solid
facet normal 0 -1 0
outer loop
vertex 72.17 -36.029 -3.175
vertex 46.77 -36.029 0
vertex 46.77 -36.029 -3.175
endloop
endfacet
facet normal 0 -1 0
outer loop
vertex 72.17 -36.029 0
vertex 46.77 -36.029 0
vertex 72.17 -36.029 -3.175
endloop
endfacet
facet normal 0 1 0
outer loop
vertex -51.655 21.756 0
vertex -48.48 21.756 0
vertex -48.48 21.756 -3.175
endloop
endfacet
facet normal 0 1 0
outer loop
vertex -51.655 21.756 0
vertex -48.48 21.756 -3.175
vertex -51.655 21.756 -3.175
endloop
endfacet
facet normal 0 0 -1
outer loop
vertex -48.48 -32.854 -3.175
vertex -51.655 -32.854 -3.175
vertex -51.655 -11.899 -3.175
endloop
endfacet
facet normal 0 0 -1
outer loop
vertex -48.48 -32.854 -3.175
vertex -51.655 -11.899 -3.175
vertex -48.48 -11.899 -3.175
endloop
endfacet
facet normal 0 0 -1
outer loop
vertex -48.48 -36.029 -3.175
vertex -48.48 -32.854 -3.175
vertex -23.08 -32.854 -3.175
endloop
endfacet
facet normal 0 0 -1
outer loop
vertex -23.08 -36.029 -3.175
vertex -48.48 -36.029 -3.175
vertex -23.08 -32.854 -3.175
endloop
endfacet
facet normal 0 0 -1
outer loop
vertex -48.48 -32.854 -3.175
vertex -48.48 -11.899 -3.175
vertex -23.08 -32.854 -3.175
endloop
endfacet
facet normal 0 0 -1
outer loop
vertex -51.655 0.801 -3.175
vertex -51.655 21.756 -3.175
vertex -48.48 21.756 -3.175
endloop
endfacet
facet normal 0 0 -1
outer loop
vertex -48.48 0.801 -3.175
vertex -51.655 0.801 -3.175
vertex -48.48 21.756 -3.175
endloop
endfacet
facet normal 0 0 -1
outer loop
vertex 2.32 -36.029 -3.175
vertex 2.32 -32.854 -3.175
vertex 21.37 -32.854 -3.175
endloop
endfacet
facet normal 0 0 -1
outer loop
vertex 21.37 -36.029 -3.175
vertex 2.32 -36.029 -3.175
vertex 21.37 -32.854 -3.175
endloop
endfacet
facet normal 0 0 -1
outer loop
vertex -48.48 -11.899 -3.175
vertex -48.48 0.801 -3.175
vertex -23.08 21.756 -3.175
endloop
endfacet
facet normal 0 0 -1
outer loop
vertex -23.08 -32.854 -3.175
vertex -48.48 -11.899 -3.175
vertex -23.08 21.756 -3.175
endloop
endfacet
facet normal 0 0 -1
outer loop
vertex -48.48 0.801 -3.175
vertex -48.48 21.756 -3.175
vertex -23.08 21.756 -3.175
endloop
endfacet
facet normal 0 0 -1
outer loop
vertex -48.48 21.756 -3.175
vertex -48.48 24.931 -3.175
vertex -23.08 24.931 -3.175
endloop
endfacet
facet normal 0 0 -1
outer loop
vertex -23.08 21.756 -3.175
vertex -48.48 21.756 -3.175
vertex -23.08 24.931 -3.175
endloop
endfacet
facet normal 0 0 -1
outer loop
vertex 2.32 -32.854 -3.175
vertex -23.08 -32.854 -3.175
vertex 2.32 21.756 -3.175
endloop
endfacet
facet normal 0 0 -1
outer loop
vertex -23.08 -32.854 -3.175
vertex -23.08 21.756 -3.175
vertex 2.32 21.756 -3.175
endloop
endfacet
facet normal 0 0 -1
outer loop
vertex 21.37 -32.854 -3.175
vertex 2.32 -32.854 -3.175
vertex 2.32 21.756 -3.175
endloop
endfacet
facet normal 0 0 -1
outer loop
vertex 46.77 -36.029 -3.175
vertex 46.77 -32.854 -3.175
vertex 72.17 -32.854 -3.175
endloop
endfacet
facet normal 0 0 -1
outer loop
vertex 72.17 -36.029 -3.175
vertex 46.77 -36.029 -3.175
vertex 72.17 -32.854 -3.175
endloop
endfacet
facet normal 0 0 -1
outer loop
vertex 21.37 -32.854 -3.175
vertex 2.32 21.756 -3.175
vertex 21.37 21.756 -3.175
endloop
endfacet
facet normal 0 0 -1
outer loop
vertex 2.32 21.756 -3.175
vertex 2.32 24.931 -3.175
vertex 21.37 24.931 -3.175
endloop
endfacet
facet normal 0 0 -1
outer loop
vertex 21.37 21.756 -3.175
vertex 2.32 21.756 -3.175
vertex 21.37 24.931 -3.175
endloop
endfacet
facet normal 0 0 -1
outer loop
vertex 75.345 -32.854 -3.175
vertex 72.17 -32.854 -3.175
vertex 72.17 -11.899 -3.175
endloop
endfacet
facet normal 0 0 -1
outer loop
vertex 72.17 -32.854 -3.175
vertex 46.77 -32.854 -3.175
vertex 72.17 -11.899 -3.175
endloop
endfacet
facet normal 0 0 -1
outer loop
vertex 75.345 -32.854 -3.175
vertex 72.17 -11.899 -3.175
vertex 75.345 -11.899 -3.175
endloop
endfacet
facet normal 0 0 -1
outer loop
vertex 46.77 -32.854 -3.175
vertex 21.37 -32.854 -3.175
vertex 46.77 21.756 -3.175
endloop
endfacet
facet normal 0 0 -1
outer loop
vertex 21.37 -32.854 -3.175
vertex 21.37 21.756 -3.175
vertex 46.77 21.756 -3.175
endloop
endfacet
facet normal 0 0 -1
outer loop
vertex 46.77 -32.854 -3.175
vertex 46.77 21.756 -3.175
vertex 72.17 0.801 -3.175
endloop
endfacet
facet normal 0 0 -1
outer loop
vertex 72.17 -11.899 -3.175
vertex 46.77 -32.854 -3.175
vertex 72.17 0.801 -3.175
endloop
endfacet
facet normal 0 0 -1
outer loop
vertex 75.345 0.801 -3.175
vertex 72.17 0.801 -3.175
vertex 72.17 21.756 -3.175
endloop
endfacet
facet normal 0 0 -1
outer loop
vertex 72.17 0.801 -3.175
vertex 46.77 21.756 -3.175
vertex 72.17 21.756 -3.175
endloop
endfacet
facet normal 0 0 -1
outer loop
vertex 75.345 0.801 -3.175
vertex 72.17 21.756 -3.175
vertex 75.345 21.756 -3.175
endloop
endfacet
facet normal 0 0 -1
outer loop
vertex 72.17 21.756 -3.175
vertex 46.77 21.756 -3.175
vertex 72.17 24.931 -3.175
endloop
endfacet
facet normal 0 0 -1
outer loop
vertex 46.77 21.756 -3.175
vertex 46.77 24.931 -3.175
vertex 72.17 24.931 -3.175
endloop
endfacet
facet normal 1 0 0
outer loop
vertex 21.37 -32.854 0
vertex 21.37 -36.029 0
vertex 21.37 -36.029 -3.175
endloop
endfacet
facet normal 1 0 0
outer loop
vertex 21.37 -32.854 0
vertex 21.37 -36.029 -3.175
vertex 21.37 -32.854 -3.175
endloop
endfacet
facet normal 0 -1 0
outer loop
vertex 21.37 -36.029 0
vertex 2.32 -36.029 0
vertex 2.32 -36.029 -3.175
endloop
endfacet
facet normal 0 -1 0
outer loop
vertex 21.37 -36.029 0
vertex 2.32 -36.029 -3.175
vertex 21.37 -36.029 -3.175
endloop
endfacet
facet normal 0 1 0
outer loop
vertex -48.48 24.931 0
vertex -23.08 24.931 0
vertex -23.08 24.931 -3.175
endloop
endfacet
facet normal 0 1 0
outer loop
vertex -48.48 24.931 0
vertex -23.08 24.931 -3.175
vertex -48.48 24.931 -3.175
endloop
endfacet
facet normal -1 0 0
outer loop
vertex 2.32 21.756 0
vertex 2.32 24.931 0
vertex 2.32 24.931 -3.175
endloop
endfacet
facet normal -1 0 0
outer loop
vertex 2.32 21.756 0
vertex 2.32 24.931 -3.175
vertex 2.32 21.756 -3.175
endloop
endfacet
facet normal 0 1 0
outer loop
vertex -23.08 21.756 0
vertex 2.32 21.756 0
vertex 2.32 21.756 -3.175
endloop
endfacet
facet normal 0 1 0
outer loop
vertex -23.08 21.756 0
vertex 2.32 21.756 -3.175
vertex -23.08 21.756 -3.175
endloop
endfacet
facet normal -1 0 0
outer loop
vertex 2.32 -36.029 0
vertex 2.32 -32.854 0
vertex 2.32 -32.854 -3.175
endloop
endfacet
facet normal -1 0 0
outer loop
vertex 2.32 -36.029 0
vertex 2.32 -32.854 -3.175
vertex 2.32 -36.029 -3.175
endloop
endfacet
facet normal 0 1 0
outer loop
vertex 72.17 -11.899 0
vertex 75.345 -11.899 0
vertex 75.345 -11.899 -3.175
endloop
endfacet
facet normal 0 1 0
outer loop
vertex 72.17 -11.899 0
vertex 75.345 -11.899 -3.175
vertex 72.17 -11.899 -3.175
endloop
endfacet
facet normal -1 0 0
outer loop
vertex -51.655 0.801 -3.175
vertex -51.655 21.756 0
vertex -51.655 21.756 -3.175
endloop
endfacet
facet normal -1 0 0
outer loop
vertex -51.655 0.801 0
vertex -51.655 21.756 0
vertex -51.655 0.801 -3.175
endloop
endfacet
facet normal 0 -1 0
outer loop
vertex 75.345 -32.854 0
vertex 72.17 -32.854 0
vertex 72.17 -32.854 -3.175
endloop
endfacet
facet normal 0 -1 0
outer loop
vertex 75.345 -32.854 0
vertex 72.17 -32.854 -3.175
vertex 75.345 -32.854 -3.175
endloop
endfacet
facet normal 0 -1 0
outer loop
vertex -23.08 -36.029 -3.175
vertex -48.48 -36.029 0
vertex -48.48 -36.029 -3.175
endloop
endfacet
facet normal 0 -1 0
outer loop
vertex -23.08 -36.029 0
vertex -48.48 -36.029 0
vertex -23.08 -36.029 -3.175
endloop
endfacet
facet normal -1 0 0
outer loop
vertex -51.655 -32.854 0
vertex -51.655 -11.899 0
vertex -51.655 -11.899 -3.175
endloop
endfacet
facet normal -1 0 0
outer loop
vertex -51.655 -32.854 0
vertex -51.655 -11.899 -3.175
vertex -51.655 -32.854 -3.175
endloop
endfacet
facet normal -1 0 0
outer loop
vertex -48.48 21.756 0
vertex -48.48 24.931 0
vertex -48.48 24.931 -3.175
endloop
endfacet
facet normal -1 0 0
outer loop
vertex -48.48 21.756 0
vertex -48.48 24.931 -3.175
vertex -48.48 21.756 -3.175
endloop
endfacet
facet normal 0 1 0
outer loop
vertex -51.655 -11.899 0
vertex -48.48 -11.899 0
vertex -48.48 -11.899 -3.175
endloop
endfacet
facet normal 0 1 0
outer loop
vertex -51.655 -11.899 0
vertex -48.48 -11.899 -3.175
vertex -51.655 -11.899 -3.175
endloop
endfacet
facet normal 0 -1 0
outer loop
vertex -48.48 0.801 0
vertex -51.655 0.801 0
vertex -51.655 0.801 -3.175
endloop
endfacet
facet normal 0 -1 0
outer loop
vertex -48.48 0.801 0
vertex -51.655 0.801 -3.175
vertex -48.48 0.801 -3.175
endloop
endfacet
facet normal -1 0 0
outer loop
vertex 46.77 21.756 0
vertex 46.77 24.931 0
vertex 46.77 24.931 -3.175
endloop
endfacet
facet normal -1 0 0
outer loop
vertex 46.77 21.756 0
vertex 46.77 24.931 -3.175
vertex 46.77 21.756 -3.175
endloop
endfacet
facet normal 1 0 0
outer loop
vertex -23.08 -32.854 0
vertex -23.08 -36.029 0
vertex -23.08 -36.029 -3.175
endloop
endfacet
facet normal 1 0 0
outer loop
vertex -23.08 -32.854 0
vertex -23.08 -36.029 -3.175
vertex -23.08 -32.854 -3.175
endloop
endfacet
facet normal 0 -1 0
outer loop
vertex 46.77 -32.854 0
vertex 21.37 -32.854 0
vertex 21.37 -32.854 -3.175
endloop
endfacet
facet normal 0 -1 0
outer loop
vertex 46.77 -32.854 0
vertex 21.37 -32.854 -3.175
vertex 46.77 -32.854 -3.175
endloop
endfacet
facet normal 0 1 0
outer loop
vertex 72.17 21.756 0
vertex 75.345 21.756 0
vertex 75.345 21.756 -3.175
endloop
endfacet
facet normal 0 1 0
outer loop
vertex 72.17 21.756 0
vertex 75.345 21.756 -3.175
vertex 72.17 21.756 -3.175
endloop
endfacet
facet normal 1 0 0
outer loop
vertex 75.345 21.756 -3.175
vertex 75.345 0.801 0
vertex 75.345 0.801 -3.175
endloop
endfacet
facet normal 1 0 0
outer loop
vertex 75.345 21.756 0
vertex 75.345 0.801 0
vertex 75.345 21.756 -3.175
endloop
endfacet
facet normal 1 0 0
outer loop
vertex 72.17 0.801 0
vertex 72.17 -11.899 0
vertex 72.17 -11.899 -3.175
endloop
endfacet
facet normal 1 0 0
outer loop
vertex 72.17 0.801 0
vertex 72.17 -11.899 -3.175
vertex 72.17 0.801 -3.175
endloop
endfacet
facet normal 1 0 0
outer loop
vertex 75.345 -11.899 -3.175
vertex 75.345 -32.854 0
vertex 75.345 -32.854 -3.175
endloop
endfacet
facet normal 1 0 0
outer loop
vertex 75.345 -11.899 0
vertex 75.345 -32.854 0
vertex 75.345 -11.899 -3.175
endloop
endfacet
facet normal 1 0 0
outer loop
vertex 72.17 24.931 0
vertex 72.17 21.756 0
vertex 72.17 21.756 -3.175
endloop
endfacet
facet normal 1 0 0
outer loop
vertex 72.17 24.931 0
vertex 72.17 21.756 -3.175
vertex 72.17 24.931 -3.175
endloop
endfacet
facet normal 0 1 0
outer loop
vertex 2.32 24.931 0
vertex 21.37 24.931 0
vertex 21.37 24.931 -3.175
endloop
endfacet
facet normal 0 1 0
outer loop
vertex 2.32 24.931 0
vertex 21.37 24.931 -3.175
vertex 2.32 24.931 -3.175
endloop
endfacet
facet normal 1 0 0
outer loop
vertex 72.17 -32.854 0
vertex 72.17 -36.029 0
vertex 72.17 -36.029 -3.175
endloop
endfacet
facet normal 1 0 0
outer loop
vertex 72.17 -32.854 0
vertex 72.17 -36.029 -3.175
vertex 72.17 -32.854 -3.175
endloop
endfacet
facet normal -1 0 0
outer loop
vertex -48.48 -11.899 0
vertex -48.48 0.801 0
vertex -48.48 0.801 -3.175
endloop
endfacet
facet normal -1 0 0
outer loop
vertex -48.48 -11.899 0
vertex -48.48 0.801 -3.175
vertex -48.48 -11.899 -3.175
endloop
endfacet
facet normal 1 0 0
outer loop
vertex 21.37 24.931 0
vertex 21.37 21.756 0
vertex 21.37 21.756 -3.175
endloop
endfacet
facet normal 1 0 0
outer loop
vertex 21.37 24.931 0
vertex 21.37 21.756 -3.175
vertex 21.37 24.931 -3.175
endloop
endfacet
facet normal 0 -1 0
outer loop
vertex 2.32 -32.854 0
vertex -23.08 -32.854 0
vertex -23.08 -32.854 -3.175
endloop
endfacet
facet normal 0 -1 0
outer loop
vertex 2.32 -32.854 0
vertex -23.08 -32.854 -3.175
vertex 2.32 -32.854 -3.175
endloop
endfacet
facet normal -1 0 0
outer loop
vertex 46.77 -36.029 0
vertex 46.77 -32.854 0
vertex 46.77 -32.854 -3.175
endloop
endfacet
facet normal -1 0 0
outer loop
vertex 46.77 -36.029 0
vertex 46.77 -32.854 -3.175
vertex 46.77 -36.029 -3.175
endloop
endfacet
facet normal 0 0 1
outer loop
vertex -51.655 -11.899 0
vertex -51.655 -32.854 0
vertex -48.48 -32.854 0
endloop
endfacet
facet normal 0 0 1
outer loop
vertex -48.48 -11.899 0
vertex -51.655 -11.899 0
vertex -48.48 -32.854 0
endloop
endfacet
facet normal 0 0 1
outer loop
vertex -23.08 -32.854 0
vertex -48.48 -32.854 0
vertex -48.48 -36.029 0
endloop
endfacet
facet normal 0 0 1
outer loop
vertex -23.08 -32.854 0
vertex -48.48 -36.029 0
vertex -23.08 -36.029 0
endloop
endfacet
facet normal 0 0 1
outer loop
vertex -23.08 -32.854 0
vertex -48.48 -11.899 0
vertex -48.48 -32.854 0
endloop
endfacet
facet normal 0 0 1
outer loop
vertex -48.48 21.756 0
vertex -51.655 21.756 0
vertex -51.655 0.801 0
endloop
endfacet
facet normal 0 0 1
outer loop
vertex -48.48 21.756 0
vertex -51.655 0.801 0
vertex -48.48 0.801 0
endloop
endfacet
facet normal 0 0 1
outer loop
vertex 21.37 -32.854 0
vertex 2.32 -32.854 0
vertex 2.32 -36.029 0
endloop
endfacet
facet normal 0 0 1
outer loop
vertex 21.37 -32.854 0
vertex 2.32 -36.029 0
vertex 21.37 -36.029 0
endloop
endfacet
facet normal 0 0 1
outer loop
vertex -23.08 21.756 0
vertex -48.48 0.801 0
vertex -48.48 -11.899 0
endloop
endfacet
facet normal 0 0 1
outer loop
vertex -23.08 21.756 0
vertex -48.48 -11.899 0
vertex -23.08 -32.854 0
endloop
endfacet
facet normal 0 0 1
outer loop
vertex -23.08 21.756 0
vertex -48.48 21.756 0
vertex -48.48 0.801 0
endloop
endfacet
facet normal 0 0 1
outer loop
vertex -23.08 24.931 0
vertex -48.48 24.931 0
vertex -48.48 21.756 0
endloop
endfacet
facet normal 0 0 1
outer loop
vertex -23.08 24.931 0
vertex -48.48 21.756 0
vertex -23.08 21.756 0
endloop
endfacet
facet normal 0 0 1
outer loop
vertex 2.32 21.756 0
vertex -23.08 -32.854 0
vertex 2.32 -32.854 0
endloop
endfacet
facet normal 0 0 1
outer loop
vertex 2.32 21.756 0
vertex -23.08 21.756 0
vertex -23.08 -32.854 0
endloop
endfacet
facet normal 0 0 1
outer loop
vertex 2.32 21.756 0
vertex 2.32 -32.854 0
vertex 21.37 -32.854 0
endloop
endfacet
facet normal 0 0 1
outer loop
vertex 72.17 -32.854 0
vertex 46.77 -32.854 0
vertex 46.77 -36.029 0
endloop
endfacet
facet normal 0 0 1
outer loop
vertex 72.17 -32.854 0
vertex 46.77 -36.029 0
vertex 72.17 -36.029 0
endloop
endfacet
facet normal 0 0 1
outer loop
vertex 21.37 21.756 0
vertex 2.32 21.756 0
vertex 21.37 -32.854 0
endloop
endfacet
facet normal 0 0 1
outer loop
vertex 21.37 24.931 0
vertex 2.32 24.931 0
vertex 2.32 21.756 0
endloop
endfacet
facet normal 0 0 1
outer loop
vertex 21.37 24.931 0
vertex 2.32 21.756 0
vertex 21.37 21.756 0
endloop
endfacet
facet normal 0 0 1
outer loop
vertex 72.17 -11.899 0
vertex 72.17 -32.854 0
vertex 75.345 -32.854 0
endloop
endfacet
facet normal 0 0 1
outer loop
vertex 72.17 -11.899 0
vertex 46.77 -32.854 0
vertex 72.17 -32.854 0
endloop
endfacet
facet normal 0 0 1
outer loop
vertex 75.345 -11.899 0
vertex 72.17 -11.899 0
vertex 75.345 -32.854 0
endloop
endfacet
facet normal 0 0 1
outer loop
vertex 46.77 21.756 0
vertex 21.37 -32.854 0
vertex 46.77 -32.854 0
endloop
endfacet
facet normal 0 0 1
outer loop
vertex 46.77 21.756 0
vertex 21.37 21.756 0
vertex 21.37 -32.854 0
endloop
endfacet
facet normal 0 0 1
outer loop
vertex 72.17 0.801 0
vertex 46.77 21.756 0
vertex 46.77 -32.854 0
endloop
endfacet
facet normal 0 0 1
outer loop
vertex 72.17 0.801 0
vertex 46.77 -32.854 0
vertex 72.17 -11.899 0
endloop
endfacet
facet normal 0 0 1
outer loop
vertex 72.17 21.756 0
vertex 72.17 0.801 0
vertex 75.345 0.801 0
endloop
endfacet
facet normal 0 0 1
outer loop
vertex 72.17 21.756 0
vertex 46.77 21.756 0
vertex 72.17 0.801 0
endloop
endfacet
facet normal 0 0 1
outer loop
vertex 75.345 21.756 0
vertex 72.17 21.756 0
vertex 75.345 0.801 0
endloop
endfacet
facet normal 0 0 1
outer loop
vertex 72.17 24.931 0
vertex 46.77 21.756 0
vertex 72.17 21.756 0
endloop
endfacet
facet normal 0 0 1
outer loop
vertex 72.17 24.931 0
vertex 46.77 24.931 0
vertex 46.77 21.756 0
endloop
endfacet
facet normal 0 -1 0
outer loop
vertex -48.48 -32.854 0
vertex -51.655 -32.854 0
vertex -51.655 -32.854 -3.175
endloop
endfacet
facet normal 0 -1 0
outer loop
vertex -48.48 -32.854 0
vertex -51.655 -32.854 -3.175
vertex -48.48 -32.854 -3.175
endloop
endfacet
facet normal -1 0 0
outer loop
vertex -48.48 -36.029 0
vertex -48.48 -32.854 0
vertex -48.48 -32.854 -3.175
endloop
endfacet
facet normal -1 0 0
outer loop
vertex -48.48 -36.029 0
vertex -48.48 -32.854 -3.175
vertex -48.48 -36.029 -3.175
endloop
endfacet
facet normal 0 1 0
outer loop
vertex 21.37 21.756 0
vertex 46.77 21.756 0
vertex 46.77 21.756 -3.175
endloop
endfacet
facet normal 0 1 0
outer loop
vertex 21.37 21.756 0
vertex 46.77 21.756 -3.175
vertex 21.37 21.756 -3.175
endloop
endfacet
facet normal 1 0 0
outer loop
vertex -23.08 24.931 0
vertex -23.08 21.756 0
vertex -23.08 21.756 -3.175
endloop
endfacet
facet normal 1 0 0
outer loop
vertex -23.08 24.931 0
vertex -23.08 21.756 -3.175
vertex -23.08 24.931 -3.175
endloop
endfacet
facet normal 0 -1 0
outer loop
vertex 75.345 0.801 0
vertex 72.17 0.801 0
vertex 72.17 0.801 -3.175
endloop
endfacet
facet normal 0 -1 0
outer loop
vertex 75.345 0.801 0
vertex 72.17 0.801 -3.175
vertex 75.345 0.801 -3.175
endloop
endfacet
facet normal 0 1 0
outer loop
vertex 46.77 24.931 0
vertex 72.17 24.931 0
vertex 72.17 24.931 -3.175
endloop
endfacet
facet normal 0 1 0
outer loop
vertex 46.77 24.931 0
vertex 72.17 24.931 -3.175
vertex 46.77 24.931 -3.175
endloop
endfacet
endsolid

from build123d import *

# Parameters (mm, degrees)
F1_DEPTH = 3.175


with BuildPart() as f1:
    # F0 (on Top) → F1 (new body)
    with BuildSketch(Plane.XY):
        Polygon((-23.080186, 24.931203), (-48.480186, 24.931203), (-48.480186, 21.756203), (-51.655186, 21.756203), (-51.655186, 0.801203), (-48.480186, 0.801203), (-48.480186, -11.898797), (-51.655186, -11.898797), (-51.655186, -32.853797), (-48.480186, -32.853797), (-48.480186, -36.028797), (-23.080186, -36.028797), (-23.080186, -32.853797), (2.319814, -32.853797), (2.319814, -36.028797), (21.369814, -36.028797), (21.369814, -32.853797), (46.769814, -32.853797), (46.769814, -36.028797), (72.169814, -36.028797), (72.169814, -32.853797), (75.344814, -32.853797), (75.344814, -11.898797), (72.169814, -11.898797), (72.169814, 0.801203), (75.344814, 0.801203), (75.344814, 21.756203), (72.169814, 21.756203), (72.169814, 24.931203), (46.769814, 24.931203), (46.769814, 21.756203), (21.369814, 21.756203), (21.369814, 24.931203), (2.319814, 24.931203), (2.319814, 21.756203), (-23.080186, 21.756203), align=None)
    extrude(amount=-F1_DEPTH)


solid = f1.part
